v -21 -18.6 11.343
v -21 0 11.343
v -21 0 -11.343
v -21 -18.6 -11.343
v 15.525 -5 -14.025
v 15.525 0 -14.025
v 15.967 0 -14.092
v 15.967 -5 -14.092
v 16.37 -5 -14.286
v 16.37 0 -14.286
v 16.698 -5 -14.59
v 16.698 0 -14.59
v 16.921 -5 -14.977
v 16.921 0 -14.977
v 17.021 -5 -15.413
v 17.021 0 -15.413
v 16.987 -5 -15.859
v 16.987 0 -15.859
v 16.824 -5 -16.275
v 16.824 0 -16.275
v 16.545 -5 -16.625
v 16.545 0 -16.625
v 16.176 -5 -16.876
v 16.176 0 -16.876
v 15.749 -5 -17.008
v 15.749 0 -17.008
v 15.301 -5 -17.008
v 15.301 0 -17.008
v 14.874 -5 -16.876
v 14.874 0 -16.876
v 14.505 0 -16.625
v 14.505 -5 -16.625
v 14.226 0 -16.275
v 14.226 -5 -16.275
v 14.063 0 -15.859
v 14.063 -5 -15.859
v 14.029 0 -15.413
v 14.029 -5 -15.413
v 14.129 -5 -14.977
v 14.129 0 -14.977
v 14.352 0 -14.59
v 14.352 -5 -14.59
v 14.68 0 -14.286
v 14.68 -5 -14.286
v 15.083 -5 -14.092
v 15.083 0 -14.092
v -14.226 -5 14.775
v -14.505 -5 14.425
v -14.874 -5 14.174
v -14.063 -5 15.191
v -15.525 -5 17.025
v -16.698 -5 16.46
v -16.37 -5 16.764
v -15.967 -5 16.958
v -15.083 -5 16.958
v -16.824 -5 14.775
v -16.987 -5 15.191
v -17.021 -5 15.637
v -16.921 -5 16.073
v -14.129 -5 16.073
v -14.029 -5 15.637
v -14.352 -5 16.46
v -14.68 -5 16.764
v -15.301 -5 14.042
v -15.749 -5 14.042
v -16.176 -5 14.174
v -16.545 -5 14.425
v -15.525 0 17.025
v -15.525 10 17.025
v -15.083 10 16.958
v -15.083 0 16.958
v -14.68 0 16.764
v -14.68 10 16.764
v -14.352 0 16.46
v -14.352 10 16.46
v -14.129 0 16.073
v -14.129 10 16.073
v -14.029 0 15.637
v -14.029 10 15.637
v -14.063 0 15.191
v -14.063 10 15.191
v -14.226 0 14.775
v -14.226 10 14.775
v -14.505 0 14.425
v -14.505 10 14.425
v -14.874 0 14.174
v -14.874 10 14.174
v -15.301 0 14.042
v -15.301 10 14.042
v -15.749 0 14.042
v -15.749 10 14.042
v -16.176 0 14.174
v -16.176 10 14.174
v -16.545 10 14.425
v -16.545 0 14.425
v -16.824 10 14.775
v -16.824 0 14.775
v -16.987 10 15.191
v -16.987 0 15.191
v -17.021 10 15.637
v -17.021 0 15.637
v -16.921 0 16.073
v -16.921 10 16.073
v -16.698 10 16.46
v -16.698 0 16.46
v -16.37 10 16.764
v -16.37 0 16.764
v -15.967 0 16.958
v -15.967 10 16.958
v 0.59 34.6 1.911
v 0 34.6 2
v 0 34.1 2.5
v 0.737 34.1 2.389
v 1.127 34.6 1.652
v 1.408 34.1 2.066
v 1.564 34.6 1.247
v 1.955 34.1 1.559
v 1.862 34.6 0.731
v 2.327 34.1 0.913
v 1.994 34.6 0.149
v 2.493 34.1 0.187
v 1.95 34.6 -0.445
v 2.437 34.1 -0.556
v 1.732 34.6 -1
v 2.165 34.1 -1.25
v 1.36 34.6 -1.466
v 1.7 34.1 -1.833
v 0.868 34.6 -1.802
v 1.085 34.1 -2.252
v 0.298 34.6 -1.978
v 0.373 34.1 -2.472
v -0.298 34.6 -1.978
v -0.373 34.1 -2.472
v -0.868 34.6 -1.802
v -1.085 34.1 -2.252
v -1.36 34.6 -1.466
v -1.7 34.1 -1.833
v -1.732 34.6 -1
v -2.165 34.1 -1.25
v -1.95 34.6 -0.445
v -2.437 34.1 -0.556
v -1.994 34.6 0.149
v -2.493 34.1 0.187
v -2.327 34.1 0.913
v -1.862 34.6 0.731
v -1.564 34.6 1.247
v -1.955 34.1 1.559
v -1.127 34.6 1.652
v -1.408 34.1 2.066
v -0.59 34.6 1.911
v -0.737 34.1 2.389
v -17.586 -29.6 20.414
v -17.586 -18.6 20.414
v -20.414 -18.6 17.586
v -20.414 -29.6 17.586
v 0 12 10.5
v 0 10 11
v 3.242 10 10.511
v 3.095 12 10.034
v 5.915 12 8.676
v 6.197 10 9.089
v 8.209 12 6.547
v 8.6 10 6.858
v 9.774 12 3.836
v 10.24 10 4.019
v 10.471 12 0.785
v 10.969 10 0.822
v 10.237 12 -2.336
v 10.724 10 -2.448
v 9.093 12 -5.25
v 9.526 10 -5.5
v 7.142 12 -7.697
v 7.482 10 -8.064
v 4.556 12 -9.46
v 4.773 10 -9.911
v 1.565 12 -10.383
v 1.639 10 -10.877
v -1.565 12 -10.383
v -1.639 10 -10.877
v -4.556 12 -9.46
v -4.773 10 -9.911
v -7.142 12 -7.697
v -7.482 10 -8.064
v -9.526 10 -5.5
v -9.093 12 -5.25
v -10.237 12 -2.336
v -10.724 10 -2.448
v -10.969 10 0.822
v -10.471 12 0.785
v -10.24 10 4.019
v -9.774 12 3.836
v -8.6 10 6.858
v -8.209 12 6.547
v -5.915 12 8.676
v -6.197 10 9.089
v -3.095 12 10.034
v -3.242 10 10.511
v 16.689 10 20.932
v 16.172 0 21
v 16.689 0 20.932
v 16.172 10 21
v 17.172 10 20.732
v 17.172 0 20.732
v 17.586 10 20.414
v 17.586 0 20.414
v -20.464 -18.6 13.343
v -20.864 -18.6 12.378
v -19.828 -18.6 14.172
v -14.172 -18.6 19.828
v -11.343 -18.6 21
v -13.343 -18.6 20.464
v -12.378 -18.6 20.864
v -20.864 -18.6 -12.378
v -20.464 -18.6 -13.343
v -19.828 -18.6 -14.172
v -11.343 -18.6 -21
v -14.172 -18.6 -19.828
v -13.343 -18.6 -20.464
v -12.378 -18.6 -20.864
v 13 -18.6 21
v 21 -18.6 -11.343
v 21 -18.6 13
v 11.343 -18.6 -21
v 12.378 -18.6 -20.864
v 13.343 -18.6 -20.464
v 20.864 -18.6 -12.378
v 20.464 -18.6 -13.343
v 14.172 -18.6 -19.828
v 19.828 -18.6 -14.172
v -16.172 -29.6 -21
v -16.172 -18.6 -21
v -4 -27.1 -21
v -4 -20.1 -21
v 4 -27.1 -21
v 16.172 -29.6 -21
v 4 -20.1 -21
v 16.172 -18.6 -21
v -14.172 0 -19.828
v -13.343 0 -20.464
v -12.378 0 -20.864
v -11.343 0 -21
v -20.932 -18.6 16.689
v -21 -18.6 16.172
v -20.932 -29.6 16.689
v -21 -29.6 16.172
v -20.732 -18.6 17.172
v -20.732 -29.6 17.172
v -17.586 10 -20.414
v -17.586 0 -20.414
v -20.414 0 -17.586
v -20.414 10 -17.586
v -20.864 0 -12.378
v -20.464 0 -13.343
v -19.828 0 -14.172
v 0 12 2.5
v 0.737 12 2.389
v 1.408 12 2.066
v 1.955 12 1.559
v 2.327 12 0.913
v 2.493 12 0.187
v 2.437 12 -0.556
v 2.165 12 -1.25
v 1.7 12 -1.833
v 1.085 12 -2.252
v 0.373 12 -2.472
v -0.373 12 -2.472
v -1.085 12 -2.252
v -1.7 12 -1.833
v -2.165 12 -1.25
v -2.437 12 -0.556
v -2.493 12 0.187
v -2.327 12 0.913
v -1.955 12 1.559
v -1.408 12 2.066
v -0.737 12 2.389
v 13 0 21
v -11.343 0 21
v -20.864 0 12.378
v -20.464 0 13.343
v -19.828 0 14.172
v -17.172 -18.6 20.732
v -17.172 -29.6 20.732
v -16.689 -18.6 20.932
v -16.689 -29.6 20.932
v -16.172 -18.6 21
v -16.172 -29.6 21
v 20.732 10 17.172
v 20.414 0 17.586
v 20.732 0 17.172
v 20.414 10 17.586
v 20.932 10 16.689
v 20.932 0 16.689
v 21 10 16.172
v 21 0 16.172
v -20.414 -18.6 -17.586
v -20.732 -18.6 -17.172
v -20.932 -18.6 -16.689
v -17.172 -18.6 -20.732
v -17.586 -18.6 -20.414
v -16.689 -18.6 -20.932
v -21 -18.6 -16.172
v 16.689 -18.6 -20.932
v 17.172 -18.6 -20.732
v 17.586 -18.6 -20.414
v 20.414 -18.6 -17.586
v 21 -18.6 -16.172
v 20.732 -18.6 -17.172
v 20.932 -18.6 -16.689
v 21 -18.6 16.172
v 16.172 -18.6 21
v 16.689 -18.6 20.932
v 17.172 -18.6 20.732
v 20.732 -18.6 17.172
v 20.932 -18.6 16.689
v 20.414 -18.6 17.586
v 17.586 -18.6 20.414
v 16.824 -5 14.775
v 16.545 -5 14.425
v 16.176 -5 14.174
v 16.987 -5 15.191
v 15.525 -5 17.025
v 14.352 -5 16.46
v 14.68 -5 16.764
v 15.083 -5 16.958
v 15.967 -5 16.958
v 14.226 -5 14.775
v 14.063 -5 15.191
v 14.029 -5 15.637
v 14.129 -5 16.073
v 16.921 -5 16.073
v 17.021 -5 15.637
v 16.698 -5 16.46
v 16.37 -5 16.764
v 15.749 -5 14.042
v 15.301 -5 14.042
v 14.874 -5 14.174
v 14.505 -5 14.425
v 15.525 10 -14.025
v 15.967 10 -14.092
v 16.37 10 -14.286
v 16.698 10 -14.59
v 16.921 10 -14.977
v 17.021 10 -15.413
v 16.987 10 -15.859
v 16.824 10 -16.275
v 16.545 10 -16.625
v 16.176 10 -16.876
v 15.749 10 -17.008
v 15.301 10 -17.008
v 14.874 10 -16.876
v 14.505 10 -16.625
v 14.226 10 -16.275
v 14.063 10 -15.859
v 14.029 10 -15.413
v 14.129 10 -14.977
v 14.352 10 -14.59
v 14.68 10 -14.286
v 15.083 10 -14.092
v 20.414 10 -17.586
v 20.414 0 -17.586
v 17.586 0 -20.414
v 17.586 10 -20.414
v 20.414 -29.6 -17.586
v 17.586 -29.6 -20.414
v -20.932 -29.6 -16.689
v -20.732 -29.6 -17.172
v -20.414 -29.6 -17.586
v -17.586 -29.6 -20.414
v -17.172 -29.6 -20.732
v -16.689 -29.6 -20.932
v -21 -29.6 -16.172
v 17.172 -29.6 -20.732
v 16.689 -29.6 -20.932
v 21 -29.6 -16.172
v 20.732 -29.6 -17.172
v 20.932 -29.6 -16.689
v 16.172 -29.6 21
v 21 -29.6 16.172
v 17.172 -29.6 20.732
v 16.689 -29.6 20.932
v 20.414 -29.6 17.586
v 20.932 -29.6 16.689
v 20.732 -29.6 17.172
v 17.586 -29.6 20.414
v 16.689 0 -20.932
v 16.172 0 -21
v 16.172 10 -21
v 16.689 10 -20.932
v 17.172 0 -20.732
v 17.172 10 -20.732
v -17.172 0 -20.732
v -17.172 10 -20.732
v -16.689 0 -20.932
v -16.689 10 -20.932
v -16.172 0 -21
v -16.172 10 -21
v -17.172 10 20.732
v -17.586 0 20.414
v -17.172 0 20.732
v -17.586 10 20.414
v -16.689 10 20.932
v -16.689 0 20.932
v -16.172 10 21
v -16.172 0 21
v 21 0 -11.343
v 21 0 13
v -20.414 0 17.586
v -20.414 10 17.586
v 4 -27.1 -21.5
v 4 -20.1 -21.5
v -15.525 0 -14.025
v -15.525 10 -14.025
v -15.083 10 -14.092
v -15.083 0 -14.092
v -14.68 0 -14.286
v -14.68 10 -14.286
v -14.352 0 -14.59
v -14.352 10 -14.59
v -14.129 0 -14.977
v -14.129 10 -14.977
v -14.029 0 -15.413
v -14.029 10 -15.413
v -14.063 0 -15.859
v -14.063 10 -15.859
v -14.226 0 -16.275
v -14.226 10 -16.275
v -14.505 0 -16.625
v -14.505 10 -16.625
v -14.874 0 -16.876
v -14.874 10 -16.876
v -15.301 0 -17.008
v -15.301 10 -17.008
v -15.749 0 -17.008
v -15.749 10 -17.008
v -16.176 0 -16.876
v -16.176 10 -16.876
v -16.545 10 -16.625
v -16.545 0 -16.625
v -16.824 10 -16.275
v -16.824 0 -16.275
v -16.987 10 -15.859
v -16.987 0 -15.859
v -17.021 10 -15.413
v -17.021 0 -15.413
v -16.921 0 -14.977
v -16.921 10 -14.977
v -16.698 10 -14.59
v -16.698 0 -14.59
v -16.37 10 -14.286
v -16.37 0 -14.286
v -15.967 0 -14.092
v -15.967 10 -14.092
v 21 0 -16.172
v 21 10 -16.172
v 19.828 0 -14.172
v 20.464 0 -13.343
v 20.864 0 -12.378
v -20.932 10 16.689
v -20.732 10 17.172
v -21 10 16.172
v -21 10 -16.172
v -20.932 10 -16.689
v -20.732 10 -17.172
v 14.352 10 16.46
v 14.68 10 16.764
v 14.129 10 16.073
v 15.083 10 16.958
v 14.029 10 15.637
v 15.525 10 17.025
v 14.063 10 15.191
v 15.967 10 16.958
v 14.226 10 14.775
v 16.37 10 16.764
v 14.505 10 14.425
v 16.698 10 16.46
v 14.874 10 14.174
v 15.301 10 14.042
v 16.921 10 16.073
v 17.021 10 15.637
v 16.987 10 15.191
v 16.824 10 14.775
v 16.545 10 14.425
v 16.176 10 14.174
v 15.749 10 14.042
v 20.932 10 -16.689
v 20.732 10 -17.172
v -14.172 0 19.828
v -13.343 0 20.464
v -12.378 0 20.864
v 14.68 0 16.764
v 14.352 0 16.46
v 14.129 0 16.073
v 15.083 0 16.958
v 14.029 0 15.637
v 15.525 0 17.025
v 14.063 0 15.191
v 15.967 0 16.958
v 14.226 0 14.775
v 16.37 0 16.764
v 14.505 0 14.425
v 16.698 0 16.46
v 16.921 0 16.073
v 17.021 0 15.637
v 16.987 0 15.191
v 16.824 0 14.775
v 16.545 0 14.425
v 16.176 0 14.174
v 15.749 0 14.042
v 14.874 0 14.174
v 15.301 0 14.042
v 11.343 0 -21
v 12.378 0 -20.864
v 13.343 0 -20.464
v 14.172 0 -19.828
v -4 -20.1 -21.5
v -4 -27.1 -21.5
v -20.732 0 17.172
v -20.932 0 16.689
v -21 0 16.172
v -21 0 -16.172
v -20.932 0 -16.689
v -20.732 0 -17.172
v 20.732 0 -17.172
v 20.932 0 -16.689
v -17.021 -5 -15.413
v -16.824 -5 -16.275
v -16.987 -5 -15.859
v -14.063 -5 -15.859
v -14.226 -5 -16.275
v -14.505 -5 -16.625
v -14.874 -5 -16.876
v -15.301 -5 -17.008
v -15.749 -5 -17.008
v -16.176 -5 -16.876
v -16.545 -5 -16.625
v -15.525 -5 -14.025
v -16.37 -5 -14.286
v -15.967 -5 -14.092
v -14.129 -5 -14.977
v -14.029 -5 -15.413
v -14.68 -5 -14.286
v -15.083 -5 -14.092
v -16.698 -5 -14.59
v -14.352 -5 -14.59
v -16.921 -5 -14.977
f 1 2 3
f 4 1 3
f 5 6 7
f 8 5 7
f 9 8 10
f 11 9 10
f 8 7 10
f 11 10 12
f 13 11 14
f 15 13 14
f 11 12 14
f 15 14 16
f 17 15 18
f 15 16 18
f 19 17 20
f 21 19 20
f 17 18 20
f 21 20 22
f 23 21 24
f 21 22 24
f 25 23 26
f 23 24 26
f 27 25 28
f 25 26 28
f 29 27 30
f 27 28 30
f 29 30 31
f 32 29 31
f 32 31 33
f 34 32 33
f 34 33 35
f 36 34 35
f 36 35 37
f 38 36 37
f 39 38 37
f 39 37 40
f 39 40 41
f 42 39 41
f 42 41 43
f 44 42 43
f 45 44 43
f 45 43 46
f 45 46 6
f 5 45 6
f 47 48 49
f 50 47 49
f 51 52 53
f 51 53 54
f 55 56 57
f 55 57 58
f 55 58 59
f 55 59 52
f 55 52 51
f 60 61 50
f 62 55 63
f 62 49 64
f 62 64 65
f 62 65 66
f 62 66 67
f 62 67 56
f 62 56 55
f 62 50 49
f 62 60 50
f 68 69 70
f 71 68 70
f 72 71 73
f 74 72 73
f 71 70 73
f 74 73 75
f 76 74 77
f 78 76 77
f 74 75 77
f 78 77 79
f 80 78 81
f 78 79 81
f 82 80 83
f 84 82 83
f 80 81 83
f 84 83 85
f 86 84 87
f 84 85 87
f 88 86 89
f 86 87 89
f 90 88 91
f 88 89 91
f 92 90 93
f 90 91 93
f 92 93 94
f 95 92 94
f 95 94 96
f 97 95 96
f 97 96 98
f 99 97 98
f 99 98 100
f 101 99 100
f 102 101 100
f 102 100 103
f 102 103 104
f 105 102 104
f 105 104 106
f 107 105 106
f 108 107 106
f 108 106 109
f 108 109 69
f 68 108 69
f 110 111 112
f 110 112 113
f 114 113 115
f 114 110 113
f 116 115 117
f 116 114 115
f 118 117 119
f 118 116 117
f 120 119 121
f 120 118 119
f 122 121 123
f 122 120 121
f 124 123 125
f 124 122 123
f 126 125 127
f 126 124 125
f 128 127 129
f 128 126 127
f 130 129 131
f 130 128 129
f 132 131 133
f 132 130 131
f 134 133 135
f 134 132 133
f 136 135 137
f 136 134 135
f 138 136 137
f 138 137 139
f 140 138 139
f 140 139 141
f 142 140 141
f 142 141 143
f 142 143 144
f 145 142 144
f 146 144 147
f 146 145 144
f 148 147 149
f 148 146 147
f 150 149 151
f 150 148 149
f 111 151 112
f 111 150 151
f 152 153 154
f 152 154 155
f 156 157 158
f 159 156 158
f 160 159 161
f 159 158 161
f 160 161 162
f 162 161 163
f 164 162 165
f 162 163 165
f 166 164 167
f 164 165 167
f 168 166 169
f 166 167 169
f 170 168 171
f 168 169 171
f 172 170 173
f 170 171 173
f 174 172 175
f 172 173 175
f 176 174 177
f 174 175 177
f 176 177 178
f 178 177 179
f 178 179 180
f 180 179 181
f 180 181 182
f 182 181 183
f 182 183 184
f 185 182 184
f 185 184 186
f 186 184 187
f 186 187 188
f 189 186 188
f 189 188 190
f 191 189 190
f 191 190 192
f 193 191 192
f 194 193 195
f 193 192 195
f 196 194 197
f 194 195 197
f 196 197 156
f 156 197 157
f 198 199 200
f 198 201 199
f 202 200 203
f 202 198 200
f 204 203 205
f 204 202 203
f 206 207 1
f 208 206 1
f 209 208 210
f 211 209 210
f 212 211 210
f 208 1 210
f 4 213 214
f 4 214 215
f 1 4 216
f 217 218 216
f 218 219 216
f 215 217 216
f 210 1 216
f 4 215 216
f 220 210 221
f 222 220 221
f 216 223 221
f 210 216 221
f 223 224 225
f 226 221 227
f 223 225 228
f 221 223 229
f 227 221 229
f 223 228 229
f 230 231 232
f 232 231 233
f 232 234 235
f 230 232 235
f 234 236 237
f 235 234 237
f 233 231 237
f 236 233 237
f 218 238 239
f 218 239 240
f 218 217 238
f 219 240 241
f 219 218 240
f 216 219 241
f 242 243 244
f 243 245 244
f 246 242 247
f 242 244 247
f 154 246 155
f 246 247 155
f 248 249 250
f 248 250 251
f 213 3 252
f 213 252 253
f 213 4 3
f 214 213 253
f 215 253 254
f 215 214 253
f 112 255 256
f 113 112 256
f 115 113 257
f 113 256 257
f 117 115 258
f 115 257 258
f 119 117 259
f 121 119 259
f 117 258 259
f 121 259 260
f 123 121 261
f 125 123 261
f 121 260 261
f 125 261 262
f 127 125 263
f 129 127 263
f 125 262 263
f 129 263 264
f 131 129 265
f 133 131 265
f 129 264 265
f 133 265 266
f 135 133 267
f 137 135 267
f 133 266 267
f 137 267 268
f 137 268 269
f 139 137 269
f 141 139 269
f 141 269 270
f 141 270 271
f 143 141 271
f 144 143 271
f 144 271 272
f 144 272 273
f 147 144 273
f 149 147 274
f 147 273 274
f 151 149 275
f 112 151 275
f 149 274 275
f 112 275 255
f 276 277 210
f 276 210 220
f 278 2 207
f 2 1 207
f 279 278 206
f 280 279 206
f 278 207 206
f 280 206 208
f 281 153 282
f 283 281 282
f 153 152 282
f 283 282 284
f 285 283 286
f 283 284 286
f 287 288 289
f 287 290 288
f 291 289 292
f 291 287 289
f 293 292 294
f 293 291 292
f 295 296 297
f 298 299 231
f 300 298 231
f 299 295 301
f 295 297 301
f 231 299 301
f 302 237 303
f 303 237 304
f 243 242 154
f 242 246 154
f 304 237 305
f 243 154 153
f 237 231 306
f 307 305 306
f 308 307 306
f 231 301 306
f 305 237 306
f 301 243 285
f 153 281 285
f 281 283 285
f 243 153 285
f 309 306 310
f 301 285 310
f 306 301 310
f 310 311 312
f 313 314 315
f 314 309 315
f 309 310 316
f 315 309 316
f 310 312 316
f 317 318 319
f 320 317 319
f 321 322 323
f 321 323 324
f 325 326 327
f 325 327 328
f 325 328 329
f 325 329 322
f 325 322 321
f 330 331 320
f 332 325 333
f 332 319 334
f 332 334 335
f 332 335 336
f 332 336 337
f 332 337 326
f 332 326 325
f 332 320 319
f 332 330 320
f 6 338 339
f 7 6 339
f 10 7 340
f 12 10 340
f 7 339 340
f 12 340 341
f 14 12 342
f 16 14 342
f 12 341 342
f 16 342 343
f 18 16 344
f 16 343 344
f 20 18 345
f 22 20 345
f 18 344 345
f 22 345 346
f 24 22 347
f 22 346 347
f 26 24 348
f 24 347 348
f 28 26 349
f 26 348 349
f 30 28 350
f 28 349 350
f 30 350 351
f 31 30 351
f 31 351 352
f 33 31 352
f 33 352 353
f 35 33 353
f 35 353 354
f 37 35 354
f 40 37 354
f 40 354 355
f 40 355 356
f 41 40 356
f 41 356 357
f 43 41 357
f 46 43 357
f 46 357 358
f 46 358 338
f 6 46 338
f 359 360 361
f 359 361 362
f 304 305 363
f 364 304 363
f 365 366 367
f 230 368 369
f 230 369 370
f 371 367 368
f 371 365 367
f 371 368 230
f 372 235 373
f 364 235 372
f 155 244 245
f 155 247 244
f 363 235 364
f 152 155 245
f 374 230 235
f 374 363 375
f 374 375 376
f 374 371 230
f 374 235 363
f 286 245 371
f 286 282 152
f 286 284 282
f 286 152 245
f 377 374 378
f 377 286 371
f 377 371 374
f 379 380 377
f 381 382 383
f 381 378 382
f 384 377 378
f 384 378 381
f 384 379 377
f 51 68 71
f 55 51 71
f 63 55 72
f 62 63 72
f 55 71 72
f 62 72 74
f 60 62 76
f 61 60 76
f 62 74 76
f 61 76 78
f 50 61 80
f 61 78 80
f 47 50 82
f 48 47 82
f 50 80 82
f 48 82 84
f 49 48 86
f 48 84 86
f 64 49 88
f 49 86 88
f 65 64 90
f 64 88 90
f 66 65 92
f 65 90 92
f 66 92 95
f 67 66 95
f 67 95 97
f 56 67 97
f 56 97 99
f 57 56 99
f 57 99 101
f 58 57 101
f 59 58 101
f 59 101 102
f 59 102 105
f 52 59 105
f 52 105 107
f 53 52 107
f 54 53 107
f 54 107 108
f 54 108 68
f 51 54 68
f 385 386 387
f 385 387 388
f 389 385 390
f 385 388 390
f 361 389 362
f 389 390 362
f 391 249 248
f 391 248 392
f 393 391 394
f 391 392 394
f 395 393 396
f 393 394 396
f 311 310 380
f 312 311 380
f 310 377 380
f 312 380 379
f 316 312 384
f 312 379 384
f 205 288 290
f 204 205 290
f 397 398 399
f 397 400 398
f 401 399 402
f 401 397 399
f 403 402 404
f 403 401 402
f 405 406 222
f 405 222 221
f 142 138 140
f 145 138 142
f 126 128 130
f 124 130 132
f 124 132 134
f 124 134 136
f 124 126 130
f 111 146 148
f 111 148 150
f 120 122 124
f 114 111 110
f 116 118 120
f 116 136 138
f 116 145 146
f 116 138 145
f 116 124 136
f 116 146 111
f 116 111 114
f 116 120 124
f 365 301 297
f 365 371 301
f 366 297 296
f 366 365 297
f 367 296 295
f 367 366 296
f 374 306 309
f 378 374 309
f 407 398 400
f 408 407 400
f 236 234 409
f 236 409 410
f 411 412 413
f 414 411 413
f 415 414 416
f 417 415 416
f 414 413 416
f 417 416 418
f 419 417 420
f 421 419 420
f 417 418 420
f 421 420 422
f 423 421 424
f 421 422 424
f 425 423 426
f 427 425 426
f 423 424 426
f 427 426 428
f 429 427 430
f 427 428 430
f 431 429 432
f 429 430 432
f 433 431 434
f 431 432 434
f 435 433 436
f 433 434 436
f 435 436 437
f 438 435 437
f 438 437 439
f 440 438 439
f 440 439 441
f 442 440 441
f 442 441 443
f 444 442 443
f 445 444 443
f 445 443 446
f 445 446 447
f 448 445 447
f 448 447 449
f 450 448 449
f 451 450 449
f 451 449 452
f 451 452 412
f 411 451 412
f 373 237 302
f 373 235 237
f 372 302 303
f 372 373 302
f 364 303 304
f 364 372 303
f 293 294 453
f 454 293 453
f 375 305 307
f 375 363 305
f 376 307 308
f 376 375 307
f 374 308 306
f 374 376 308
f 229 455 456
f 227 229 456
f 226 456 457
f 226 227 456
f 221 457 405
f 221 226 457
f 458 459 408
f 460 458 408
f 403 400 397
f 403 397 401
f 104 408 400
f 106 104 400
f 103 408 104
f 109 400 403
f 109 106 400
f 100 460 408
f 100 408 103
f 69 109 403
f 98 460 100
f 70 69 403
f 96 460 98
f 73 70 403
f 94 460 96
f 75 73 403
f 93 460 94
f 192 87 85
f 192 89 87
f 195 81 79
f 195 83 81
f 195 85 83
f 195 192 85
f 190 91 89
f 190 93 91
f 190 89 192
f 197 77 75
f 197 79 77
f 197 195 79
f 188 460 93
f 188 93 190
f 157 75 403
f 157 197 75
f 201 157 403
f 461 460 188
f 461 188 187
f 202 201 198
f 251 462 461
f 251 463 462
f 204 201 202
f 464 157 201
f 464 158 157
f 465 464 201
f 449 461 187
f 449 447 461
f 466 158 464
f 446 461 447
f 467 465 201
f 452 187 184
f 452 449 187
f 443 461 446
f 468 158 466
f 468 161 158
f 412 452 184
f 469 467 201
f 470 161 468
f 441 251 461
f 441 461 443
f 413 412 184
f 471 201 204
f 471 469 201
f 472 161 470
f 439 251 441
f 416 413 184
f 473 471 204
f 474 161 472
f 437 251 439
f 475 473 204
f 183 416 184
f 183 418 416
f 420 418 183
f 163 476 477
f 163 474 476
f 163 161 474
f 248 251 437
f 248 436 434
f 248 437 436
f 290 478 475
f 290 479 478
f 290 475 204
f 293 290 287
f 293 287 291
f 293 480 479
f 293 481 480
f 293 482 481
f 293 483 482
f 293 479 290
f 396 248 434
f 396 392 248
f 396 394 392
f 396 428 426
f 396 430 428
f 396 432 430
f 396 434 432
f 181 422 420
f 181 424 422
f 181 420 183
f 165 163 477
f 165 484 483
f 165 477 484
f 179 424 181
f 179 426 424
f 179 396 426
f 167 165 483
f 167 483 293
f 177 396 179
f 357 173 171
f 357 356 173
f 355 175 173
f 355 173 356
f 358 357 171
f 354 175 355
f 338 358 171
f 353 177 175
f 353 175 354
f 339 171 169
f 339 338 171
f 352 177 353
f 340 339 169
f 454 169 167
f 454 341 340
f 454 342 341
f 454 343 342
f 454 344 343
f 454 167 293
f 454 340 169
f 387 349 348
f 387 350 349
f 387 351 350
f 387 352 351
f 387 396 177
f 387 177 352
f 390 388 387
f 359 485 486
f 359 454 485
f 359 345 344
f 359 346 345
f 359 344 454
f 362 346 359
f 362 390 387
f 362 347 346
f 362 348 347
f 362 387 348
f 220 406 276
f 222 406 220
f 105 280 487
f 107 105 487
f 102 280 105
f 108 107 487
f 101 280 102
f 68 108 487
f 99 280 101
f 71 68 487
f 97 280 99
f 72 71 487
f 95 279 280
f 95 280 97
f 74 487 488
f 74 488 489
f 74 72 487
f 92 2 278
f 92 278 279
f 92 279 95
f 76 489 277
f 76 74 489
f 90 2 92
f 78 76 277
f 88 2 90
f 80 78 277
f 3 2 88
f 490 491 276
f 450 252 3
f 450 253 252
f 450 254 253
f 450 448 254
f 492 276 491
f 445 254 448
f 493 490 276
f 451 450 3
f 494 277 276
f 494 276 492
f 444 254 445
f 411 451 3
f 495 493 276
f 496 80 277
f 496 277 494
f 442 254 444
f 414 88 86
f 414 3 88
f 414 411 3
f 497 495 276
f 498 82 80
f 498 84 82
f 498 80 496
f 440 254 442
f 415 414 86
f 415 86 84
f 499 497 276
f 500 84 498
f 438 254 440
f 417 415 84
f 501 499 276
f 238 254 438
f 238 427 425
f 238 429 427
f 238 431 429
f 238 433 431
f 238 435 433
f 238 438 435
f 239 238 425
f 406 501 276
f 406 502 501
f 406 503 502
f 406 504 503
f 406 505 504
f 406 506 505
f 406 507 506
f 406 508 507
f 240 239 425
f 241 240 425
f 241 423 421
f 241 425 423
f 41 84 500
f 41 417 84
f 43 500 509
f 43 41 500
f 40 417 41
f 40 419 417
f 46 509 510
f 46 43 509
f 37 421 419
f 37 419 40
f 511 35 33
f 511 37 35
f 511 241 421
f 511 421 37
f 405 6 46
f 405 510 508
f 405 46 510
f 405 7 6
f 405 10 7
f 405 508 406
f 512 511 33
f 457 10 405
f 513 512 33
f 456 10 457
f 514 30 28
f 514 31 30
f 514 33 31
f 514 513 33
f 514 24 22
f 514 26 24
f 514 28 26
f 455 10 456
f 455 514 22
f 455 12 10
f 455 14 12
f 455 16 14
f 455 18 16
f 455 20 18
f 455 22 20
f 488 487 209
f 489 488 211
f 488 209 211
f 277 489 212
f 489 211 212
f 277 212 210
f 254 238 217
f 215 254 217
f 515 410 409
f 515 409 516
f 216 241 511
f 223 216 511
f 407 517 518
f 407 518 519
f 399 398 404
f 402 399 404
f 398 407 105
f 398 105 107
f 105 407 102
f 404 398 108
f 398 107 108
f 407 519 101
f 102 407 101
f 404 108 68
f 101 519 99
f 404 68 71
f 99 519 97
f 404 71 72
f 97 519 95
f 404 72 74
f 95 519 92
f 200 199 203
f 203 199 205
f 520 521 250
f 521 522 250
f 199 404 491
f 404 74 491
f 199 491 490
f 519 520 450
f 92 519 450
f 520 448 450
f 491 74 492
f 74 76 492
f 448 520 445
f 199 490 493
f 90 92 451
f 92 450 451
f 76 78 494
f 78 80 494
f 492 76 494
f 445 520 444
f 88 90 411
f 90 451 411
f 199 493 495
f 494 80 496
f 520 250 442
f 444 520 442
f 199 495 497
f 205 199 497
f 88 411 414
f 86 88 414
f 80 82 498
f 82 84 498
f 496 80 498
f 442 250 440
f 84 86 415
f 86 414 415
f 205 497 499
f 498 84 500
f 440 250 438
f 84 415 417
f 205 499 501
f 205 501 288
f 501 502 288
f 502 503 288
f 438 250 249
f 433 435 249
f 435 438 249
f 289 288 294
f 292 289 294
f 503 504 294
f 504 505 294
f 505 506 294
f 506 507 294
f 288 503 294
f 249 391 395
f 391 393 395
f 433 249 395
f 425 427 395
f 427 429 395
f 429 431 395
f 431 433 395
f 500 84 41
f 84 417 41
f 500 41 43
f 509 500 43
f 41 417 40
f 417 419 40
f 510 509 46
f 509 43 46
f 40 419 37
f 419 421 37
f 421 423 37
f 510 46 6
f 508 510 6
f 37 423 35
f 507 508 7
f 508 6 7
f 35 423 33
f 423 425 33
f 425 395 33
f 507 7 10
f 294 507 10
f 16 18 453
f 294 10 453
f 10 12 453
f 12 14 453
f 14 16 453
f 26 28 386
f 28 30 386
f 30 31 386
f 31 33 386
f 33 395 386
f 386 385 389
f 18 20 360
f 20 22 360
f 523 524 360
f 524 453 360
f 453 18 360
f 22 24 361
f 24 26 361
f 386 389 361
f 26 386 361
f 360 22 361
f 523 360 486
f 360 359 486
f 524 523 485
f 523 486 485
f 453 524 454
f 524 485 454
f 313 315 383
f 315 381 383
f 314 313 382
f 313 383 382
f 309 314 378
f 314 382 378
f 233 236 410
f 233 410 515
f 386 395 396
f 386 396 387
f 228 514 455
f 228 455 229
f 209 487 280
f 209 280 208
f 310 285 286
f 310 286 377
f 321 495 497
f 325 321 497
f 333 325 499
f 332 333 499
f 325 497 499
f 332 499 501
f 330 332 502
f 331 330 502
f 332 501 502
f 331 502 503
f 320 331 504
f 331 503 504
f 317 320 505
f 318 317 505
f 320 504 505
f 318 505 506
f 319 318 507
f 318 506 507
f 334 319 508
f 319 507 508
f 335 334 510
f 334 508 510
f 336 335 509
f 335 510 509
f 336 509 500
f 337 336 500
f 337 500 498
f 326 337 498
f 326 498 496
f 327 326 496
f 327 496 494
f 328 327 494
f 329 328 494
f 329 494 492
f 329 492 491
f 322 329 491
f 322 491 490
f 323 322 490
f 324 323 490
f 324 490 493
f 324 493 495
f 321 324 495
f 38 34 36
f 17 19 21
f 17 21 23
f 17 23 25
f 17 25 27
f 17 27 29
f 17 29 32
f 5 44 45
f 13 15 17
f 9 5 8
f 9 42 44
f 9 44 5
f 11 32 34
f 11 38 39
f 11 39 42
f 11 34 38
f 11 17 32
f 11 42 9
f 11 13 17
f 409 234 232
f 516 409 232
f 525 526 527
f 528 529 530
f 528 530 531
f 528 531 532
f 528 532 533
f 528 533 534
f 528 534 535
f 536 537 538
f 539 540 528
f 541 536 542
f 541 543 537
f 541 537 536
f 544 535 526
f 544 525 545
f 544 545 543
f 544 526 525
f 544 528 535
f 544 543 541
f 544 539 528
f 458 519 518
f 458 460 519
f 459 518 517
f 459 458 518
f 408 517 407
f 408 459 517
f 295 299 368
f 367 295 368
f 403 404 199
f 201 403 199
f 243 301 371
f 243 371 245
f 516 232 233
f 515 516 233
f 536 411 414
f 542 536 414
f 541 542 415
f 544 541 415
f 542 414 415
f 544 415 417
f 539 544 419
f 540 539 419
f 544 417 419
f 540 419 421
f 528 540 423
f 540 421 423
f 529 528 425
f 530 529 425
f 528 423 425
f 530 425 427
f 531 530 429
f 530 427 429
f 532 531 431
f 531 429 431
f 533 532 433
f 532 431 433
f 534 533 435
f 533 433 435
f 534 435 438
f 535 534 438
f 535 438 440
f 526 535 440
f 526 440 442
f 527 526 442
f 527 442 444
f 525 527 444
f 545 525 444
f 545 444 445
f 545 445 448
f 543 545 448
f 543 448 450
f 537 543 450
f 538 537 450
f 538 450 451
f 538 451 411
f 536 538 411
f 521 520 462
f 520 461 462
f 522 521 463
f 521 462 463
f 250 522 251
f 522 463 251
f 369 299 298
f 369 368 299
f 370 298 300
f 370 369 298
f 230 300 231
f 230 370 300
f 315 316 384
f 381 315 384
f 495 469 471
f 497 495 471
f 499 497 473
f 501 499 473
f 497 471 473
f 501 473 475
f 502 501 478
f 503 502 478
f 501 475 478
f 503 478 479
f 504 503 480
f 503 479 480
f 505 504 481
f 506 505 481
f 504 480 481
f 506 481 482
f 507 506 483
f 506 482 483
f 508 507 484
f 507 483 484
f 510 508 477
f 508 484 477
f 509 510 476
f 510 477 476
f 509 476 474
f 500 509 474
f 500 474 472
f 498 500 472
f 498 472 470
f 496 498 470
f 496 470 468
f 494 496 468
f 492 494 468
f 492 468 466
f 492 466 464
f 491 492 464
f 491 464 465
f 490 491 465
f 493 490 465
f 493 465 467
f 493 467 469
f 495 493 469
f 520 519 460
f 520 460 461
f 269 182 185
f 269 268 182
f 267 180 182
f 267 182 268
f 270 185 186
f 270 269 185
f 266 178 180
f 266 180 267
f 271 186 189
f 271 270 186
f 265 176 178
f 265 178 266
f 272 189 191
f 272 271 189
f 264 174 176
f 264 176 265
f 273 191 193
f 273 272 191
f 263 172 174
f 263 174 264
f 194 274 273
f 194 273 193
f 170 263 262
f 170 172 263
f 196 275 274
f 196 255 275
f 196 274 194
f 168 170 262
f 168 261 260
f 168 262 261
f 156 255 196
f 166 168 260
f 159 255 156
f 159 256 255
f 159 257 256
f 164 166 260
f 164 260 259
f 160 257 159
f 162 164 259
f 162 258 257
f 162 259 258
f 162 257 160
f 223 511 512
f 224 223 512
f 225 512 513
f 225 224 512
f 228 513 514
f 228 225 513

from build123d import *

# Parameters (mm, degrees)
SKETCH1_W           = 42
SKETCH1_H           = 42
BOSS_EXTRUDE1_DEPTH = 10
SKETCH2_R           = 11
BOSS_EXTRUDE2_DEPTH = 2
SKETCH3_R           = 2.5
BOSS_EXTRUDE3_DEPTH = 22.6
CHAMFER2_SIZE       = 0.5
CHAMFER3_SIZE2      = 2
CHAMFER3_SIZE       = 0.5
SKETCH1_4_W         = 42
SKETCH1_4_H         = 42
BOSS_EXTRUDE6_DEPTH = 18.6
SKETCH6_W           = 42
SKETCH6_H           = 42
BOSS_EXTRUDE7_DEPTH = 11
CHAMFER5_SIZE       = 4
CHAMFER6_SIZE       = 4
FILLET2_R           = 2
FILLET3_R           = 2
SKETCH7_W           = 8
SKETCH7_H           = 7
BOSS_EXTRUDE8_DEPTH = 0.5
CHAMFER7_SIZE       = 8
FILLET4_R           = 4
SKETCH8_R           = 1.5
CUT_EXTRUDE2_DEPTH  = 15


with BuildPart() as part:
    # Sketch1 → Boss-Extrude1 (new body)
    with BuildSketch(Plane(origin=(0, 0, 0), x_dir=(1, 0, 0), z_dir=(0, 1, 0))):
        Rectangle(SKETCH1_W, SKETCH1_H)
    extrude(amount=BOSS_EXTRUDE1_DEPTH)

    # Sketch2 → Boss-Extrude2 (add)
    with BuildSketch(Plane(origin=(0, 10, 0), x_dir=(1, 0, 0), z_dir=(0, 1, 0))):
        with Locations(Location((0, 0, 0), (0, 0, 270))):
            Circle(SKETCH2_R)
    extrude(amount=BOSS_EXTRUDE2_DEPTH)

    # Sketch3 → Boss-Extrude3 (add)
    with BuildSketch(Plane(origin=(0, 12, 0), x_dir=(1, 0, 0), z_dir=(0, 1, 0))):
        with Locations(Location((0, 0, 0), (0, 0, 270))):
            Circle(SKETCH3_R)
    extrude(amount=BOSS_EXTRUDE3_DEPTH)

    # Chamfer2
    chamfer2_edges = [part.edges().sort_by_distance(p)[0] for p in [
        (0, 34.6, -2.5),
    ]]
    chamfer(chamfer2_edges, length=CHAMFER2_SIZE)

    # Chamfer3
    chamfer3_edges = [part.edges().sort_by_distance(p)[0] for p in [
        (0, 12, -11),
    ]]
    chamfer3_side = [part.faces().sort_by_distance(p)[0] for p in [
        (0, 12, -10.99),
    ]]
    chamfer(chamfer3_edges, length=CHAMFER3_SIZE - 0.0001, length2=CHAMFER3_SIZE2 - 0.0001, reference=chamfer3_side[0])  # a hair under: the kernel refuses the full size

    # Chamfer5
    chamfer5_edges = [part.edges().sort_by_distance(p)[0] for p in [
        (-21, 5, -21),
        (21, 5, -21),
        (21, 5, 21),
        (-21, 5, 21),
    ]]
    chamfer(chamfer5_edges, length=CHAMFER5_SIZE)

    # Fillet2
    fillet2_edges = [part.edges().sort_by_distance(p)[0] for p in [
        (21, 5, -17),
        (21, 5, 17),
        (-17, 5, 21),
        (17, 5, 21),
        (-17, 5, -21),
        (17, 5, -21),
        (-21, 5, -17),
        (-21, 5, 17),
    ]]
    fillet(fillet2_edges, radius=FILLET2_R)


with BuildPart() as body_2:
    # Sketch1<4> → Boss-Extrude6 (new body)
    with BuildSketch(Plane(origin=(0, 0, 0), x_dir=(1, 0, 0), z_dir=(0, 1, 0))):
        Rectangle(SKETCH1_4_W, SKETCH1_4_H)
    extrude(amount=-BOSS_EXTRUDE6_DEPTH)

    # Chamfer7
    chamfer7_edges = [body_2.edges().sort_by_distance(p)[0] for p in [
        (-21, -9.3, -21),
        (21, -9.3, -21),
        (21, -9.3, 21),
        (-21, -9.3, 21),
    ]]
    chamfer(chamfer7_edges, length=CHAMFER7_SIZE)

    # Fillet4
    fillet4_edges = [body_2.edges().sort_by_distance(p)[0] for p in [
        (13, -9.3, -21),
        (-13, -9.3, -21),
        (-21, -9.3, 13),
        (-21, -9.3, -13),
        (-13, -9.3, 21),
        (21, -9.3, -13),
    ]]
    fillet(fillet4_edges, radius=FILLET4_R)


with BuildPart() as body_3:
    # Sketch6 → Boss-Extrude7 (new body)
    with BuildSketch(Plane.XZ.offset(18.6)):
        Rectangle(SKETCH6_W, SKETCH6_H)
    extrude(amount=BOSS_EXTRUDE7_DEPTH)

    # Chamfer6
    chamfer6_edges = [body_3.edges().sort_by_distance(p)[0] for p in [
        (-21, -24.1, 21),
        (21, -24.1, 21),
        (21, -24.1, -21),
        (-21, -24.1, -21),
    ]]
    chamfer(chamfer6_edges, length=CHAMFER6_SIZE)

    # Fillet3
    fillet3_edges = [body_3.edges().sort_by_distance(p)[0] for p in [
        (21, -24.1, 17),
        (21, -24.1, -17),
        (-17, -24.1, -21),
        (17, -24.1, -21),
        (-21, -24.1, 17),
        (-21, -24.1, -17),
        (17, -24.1, 21),
        (-17, -24.1, 21),
    ]]
    fillet(fillet3_edges, radius=FILLET3_R)

    # Sketch7 → Boss-Extrude8 (add)
    with BuildSketch(Plane(origin=(0, 0, -21), x_dir=(-1, 0, 0), z_dir=(0, 0, -1))):
        with Locations((0, -23.6)):
            Rectangle(SKETCH7_W, SKETCH7_H)
    extrude(amount=BOSS_EXTRUDE8_DEPTH)


with BuildPart() as cut_extrude2_tool:
    # Sketch8 → Cut-Extrude2 (new body)
    with BuildSketch(Plane(origin=(0, 10, 0), x_dir=(1, 0, 0), z_dir=(0, 1, 0))):
        with Locations(Location((-15.525, 15.525, 0), (0, 0, 270))):
            Circle(SKETCH8_R)
        with Locations(Location((15.525, 15.525, 0), (0, 0, 270))):
            Circle(SKETCH8_R)
        with Locations(Location((15.525, -15.525, 0), (0, 0, 270))):
            Circle(SKETCH8_R)
        with Locations(Location((-15.525, -15.525, 0), (0, 0, 270))):
            Circle(SKETCH8_R)
    extrude(amount=-CUT_EXTRUDE2_DEPTH)


with BuildPart() as part_1:
    add(part.part)

    # Cut-Extrude2: cut by cut_extrude2_tool
    add(cut_extrude2_tool.part, mode=Mode.SUBTRACT)


with BuildPart() as body_2_1:
    add(body_2.part)

    # Cut-Extrude2: cut by cut_extrude2_tool
    add(cut_extrude2_tool.part, mode=Mode.SUBTRACT)


solid = Compound([body_3.part, part_1.part, body_2_1.part])
